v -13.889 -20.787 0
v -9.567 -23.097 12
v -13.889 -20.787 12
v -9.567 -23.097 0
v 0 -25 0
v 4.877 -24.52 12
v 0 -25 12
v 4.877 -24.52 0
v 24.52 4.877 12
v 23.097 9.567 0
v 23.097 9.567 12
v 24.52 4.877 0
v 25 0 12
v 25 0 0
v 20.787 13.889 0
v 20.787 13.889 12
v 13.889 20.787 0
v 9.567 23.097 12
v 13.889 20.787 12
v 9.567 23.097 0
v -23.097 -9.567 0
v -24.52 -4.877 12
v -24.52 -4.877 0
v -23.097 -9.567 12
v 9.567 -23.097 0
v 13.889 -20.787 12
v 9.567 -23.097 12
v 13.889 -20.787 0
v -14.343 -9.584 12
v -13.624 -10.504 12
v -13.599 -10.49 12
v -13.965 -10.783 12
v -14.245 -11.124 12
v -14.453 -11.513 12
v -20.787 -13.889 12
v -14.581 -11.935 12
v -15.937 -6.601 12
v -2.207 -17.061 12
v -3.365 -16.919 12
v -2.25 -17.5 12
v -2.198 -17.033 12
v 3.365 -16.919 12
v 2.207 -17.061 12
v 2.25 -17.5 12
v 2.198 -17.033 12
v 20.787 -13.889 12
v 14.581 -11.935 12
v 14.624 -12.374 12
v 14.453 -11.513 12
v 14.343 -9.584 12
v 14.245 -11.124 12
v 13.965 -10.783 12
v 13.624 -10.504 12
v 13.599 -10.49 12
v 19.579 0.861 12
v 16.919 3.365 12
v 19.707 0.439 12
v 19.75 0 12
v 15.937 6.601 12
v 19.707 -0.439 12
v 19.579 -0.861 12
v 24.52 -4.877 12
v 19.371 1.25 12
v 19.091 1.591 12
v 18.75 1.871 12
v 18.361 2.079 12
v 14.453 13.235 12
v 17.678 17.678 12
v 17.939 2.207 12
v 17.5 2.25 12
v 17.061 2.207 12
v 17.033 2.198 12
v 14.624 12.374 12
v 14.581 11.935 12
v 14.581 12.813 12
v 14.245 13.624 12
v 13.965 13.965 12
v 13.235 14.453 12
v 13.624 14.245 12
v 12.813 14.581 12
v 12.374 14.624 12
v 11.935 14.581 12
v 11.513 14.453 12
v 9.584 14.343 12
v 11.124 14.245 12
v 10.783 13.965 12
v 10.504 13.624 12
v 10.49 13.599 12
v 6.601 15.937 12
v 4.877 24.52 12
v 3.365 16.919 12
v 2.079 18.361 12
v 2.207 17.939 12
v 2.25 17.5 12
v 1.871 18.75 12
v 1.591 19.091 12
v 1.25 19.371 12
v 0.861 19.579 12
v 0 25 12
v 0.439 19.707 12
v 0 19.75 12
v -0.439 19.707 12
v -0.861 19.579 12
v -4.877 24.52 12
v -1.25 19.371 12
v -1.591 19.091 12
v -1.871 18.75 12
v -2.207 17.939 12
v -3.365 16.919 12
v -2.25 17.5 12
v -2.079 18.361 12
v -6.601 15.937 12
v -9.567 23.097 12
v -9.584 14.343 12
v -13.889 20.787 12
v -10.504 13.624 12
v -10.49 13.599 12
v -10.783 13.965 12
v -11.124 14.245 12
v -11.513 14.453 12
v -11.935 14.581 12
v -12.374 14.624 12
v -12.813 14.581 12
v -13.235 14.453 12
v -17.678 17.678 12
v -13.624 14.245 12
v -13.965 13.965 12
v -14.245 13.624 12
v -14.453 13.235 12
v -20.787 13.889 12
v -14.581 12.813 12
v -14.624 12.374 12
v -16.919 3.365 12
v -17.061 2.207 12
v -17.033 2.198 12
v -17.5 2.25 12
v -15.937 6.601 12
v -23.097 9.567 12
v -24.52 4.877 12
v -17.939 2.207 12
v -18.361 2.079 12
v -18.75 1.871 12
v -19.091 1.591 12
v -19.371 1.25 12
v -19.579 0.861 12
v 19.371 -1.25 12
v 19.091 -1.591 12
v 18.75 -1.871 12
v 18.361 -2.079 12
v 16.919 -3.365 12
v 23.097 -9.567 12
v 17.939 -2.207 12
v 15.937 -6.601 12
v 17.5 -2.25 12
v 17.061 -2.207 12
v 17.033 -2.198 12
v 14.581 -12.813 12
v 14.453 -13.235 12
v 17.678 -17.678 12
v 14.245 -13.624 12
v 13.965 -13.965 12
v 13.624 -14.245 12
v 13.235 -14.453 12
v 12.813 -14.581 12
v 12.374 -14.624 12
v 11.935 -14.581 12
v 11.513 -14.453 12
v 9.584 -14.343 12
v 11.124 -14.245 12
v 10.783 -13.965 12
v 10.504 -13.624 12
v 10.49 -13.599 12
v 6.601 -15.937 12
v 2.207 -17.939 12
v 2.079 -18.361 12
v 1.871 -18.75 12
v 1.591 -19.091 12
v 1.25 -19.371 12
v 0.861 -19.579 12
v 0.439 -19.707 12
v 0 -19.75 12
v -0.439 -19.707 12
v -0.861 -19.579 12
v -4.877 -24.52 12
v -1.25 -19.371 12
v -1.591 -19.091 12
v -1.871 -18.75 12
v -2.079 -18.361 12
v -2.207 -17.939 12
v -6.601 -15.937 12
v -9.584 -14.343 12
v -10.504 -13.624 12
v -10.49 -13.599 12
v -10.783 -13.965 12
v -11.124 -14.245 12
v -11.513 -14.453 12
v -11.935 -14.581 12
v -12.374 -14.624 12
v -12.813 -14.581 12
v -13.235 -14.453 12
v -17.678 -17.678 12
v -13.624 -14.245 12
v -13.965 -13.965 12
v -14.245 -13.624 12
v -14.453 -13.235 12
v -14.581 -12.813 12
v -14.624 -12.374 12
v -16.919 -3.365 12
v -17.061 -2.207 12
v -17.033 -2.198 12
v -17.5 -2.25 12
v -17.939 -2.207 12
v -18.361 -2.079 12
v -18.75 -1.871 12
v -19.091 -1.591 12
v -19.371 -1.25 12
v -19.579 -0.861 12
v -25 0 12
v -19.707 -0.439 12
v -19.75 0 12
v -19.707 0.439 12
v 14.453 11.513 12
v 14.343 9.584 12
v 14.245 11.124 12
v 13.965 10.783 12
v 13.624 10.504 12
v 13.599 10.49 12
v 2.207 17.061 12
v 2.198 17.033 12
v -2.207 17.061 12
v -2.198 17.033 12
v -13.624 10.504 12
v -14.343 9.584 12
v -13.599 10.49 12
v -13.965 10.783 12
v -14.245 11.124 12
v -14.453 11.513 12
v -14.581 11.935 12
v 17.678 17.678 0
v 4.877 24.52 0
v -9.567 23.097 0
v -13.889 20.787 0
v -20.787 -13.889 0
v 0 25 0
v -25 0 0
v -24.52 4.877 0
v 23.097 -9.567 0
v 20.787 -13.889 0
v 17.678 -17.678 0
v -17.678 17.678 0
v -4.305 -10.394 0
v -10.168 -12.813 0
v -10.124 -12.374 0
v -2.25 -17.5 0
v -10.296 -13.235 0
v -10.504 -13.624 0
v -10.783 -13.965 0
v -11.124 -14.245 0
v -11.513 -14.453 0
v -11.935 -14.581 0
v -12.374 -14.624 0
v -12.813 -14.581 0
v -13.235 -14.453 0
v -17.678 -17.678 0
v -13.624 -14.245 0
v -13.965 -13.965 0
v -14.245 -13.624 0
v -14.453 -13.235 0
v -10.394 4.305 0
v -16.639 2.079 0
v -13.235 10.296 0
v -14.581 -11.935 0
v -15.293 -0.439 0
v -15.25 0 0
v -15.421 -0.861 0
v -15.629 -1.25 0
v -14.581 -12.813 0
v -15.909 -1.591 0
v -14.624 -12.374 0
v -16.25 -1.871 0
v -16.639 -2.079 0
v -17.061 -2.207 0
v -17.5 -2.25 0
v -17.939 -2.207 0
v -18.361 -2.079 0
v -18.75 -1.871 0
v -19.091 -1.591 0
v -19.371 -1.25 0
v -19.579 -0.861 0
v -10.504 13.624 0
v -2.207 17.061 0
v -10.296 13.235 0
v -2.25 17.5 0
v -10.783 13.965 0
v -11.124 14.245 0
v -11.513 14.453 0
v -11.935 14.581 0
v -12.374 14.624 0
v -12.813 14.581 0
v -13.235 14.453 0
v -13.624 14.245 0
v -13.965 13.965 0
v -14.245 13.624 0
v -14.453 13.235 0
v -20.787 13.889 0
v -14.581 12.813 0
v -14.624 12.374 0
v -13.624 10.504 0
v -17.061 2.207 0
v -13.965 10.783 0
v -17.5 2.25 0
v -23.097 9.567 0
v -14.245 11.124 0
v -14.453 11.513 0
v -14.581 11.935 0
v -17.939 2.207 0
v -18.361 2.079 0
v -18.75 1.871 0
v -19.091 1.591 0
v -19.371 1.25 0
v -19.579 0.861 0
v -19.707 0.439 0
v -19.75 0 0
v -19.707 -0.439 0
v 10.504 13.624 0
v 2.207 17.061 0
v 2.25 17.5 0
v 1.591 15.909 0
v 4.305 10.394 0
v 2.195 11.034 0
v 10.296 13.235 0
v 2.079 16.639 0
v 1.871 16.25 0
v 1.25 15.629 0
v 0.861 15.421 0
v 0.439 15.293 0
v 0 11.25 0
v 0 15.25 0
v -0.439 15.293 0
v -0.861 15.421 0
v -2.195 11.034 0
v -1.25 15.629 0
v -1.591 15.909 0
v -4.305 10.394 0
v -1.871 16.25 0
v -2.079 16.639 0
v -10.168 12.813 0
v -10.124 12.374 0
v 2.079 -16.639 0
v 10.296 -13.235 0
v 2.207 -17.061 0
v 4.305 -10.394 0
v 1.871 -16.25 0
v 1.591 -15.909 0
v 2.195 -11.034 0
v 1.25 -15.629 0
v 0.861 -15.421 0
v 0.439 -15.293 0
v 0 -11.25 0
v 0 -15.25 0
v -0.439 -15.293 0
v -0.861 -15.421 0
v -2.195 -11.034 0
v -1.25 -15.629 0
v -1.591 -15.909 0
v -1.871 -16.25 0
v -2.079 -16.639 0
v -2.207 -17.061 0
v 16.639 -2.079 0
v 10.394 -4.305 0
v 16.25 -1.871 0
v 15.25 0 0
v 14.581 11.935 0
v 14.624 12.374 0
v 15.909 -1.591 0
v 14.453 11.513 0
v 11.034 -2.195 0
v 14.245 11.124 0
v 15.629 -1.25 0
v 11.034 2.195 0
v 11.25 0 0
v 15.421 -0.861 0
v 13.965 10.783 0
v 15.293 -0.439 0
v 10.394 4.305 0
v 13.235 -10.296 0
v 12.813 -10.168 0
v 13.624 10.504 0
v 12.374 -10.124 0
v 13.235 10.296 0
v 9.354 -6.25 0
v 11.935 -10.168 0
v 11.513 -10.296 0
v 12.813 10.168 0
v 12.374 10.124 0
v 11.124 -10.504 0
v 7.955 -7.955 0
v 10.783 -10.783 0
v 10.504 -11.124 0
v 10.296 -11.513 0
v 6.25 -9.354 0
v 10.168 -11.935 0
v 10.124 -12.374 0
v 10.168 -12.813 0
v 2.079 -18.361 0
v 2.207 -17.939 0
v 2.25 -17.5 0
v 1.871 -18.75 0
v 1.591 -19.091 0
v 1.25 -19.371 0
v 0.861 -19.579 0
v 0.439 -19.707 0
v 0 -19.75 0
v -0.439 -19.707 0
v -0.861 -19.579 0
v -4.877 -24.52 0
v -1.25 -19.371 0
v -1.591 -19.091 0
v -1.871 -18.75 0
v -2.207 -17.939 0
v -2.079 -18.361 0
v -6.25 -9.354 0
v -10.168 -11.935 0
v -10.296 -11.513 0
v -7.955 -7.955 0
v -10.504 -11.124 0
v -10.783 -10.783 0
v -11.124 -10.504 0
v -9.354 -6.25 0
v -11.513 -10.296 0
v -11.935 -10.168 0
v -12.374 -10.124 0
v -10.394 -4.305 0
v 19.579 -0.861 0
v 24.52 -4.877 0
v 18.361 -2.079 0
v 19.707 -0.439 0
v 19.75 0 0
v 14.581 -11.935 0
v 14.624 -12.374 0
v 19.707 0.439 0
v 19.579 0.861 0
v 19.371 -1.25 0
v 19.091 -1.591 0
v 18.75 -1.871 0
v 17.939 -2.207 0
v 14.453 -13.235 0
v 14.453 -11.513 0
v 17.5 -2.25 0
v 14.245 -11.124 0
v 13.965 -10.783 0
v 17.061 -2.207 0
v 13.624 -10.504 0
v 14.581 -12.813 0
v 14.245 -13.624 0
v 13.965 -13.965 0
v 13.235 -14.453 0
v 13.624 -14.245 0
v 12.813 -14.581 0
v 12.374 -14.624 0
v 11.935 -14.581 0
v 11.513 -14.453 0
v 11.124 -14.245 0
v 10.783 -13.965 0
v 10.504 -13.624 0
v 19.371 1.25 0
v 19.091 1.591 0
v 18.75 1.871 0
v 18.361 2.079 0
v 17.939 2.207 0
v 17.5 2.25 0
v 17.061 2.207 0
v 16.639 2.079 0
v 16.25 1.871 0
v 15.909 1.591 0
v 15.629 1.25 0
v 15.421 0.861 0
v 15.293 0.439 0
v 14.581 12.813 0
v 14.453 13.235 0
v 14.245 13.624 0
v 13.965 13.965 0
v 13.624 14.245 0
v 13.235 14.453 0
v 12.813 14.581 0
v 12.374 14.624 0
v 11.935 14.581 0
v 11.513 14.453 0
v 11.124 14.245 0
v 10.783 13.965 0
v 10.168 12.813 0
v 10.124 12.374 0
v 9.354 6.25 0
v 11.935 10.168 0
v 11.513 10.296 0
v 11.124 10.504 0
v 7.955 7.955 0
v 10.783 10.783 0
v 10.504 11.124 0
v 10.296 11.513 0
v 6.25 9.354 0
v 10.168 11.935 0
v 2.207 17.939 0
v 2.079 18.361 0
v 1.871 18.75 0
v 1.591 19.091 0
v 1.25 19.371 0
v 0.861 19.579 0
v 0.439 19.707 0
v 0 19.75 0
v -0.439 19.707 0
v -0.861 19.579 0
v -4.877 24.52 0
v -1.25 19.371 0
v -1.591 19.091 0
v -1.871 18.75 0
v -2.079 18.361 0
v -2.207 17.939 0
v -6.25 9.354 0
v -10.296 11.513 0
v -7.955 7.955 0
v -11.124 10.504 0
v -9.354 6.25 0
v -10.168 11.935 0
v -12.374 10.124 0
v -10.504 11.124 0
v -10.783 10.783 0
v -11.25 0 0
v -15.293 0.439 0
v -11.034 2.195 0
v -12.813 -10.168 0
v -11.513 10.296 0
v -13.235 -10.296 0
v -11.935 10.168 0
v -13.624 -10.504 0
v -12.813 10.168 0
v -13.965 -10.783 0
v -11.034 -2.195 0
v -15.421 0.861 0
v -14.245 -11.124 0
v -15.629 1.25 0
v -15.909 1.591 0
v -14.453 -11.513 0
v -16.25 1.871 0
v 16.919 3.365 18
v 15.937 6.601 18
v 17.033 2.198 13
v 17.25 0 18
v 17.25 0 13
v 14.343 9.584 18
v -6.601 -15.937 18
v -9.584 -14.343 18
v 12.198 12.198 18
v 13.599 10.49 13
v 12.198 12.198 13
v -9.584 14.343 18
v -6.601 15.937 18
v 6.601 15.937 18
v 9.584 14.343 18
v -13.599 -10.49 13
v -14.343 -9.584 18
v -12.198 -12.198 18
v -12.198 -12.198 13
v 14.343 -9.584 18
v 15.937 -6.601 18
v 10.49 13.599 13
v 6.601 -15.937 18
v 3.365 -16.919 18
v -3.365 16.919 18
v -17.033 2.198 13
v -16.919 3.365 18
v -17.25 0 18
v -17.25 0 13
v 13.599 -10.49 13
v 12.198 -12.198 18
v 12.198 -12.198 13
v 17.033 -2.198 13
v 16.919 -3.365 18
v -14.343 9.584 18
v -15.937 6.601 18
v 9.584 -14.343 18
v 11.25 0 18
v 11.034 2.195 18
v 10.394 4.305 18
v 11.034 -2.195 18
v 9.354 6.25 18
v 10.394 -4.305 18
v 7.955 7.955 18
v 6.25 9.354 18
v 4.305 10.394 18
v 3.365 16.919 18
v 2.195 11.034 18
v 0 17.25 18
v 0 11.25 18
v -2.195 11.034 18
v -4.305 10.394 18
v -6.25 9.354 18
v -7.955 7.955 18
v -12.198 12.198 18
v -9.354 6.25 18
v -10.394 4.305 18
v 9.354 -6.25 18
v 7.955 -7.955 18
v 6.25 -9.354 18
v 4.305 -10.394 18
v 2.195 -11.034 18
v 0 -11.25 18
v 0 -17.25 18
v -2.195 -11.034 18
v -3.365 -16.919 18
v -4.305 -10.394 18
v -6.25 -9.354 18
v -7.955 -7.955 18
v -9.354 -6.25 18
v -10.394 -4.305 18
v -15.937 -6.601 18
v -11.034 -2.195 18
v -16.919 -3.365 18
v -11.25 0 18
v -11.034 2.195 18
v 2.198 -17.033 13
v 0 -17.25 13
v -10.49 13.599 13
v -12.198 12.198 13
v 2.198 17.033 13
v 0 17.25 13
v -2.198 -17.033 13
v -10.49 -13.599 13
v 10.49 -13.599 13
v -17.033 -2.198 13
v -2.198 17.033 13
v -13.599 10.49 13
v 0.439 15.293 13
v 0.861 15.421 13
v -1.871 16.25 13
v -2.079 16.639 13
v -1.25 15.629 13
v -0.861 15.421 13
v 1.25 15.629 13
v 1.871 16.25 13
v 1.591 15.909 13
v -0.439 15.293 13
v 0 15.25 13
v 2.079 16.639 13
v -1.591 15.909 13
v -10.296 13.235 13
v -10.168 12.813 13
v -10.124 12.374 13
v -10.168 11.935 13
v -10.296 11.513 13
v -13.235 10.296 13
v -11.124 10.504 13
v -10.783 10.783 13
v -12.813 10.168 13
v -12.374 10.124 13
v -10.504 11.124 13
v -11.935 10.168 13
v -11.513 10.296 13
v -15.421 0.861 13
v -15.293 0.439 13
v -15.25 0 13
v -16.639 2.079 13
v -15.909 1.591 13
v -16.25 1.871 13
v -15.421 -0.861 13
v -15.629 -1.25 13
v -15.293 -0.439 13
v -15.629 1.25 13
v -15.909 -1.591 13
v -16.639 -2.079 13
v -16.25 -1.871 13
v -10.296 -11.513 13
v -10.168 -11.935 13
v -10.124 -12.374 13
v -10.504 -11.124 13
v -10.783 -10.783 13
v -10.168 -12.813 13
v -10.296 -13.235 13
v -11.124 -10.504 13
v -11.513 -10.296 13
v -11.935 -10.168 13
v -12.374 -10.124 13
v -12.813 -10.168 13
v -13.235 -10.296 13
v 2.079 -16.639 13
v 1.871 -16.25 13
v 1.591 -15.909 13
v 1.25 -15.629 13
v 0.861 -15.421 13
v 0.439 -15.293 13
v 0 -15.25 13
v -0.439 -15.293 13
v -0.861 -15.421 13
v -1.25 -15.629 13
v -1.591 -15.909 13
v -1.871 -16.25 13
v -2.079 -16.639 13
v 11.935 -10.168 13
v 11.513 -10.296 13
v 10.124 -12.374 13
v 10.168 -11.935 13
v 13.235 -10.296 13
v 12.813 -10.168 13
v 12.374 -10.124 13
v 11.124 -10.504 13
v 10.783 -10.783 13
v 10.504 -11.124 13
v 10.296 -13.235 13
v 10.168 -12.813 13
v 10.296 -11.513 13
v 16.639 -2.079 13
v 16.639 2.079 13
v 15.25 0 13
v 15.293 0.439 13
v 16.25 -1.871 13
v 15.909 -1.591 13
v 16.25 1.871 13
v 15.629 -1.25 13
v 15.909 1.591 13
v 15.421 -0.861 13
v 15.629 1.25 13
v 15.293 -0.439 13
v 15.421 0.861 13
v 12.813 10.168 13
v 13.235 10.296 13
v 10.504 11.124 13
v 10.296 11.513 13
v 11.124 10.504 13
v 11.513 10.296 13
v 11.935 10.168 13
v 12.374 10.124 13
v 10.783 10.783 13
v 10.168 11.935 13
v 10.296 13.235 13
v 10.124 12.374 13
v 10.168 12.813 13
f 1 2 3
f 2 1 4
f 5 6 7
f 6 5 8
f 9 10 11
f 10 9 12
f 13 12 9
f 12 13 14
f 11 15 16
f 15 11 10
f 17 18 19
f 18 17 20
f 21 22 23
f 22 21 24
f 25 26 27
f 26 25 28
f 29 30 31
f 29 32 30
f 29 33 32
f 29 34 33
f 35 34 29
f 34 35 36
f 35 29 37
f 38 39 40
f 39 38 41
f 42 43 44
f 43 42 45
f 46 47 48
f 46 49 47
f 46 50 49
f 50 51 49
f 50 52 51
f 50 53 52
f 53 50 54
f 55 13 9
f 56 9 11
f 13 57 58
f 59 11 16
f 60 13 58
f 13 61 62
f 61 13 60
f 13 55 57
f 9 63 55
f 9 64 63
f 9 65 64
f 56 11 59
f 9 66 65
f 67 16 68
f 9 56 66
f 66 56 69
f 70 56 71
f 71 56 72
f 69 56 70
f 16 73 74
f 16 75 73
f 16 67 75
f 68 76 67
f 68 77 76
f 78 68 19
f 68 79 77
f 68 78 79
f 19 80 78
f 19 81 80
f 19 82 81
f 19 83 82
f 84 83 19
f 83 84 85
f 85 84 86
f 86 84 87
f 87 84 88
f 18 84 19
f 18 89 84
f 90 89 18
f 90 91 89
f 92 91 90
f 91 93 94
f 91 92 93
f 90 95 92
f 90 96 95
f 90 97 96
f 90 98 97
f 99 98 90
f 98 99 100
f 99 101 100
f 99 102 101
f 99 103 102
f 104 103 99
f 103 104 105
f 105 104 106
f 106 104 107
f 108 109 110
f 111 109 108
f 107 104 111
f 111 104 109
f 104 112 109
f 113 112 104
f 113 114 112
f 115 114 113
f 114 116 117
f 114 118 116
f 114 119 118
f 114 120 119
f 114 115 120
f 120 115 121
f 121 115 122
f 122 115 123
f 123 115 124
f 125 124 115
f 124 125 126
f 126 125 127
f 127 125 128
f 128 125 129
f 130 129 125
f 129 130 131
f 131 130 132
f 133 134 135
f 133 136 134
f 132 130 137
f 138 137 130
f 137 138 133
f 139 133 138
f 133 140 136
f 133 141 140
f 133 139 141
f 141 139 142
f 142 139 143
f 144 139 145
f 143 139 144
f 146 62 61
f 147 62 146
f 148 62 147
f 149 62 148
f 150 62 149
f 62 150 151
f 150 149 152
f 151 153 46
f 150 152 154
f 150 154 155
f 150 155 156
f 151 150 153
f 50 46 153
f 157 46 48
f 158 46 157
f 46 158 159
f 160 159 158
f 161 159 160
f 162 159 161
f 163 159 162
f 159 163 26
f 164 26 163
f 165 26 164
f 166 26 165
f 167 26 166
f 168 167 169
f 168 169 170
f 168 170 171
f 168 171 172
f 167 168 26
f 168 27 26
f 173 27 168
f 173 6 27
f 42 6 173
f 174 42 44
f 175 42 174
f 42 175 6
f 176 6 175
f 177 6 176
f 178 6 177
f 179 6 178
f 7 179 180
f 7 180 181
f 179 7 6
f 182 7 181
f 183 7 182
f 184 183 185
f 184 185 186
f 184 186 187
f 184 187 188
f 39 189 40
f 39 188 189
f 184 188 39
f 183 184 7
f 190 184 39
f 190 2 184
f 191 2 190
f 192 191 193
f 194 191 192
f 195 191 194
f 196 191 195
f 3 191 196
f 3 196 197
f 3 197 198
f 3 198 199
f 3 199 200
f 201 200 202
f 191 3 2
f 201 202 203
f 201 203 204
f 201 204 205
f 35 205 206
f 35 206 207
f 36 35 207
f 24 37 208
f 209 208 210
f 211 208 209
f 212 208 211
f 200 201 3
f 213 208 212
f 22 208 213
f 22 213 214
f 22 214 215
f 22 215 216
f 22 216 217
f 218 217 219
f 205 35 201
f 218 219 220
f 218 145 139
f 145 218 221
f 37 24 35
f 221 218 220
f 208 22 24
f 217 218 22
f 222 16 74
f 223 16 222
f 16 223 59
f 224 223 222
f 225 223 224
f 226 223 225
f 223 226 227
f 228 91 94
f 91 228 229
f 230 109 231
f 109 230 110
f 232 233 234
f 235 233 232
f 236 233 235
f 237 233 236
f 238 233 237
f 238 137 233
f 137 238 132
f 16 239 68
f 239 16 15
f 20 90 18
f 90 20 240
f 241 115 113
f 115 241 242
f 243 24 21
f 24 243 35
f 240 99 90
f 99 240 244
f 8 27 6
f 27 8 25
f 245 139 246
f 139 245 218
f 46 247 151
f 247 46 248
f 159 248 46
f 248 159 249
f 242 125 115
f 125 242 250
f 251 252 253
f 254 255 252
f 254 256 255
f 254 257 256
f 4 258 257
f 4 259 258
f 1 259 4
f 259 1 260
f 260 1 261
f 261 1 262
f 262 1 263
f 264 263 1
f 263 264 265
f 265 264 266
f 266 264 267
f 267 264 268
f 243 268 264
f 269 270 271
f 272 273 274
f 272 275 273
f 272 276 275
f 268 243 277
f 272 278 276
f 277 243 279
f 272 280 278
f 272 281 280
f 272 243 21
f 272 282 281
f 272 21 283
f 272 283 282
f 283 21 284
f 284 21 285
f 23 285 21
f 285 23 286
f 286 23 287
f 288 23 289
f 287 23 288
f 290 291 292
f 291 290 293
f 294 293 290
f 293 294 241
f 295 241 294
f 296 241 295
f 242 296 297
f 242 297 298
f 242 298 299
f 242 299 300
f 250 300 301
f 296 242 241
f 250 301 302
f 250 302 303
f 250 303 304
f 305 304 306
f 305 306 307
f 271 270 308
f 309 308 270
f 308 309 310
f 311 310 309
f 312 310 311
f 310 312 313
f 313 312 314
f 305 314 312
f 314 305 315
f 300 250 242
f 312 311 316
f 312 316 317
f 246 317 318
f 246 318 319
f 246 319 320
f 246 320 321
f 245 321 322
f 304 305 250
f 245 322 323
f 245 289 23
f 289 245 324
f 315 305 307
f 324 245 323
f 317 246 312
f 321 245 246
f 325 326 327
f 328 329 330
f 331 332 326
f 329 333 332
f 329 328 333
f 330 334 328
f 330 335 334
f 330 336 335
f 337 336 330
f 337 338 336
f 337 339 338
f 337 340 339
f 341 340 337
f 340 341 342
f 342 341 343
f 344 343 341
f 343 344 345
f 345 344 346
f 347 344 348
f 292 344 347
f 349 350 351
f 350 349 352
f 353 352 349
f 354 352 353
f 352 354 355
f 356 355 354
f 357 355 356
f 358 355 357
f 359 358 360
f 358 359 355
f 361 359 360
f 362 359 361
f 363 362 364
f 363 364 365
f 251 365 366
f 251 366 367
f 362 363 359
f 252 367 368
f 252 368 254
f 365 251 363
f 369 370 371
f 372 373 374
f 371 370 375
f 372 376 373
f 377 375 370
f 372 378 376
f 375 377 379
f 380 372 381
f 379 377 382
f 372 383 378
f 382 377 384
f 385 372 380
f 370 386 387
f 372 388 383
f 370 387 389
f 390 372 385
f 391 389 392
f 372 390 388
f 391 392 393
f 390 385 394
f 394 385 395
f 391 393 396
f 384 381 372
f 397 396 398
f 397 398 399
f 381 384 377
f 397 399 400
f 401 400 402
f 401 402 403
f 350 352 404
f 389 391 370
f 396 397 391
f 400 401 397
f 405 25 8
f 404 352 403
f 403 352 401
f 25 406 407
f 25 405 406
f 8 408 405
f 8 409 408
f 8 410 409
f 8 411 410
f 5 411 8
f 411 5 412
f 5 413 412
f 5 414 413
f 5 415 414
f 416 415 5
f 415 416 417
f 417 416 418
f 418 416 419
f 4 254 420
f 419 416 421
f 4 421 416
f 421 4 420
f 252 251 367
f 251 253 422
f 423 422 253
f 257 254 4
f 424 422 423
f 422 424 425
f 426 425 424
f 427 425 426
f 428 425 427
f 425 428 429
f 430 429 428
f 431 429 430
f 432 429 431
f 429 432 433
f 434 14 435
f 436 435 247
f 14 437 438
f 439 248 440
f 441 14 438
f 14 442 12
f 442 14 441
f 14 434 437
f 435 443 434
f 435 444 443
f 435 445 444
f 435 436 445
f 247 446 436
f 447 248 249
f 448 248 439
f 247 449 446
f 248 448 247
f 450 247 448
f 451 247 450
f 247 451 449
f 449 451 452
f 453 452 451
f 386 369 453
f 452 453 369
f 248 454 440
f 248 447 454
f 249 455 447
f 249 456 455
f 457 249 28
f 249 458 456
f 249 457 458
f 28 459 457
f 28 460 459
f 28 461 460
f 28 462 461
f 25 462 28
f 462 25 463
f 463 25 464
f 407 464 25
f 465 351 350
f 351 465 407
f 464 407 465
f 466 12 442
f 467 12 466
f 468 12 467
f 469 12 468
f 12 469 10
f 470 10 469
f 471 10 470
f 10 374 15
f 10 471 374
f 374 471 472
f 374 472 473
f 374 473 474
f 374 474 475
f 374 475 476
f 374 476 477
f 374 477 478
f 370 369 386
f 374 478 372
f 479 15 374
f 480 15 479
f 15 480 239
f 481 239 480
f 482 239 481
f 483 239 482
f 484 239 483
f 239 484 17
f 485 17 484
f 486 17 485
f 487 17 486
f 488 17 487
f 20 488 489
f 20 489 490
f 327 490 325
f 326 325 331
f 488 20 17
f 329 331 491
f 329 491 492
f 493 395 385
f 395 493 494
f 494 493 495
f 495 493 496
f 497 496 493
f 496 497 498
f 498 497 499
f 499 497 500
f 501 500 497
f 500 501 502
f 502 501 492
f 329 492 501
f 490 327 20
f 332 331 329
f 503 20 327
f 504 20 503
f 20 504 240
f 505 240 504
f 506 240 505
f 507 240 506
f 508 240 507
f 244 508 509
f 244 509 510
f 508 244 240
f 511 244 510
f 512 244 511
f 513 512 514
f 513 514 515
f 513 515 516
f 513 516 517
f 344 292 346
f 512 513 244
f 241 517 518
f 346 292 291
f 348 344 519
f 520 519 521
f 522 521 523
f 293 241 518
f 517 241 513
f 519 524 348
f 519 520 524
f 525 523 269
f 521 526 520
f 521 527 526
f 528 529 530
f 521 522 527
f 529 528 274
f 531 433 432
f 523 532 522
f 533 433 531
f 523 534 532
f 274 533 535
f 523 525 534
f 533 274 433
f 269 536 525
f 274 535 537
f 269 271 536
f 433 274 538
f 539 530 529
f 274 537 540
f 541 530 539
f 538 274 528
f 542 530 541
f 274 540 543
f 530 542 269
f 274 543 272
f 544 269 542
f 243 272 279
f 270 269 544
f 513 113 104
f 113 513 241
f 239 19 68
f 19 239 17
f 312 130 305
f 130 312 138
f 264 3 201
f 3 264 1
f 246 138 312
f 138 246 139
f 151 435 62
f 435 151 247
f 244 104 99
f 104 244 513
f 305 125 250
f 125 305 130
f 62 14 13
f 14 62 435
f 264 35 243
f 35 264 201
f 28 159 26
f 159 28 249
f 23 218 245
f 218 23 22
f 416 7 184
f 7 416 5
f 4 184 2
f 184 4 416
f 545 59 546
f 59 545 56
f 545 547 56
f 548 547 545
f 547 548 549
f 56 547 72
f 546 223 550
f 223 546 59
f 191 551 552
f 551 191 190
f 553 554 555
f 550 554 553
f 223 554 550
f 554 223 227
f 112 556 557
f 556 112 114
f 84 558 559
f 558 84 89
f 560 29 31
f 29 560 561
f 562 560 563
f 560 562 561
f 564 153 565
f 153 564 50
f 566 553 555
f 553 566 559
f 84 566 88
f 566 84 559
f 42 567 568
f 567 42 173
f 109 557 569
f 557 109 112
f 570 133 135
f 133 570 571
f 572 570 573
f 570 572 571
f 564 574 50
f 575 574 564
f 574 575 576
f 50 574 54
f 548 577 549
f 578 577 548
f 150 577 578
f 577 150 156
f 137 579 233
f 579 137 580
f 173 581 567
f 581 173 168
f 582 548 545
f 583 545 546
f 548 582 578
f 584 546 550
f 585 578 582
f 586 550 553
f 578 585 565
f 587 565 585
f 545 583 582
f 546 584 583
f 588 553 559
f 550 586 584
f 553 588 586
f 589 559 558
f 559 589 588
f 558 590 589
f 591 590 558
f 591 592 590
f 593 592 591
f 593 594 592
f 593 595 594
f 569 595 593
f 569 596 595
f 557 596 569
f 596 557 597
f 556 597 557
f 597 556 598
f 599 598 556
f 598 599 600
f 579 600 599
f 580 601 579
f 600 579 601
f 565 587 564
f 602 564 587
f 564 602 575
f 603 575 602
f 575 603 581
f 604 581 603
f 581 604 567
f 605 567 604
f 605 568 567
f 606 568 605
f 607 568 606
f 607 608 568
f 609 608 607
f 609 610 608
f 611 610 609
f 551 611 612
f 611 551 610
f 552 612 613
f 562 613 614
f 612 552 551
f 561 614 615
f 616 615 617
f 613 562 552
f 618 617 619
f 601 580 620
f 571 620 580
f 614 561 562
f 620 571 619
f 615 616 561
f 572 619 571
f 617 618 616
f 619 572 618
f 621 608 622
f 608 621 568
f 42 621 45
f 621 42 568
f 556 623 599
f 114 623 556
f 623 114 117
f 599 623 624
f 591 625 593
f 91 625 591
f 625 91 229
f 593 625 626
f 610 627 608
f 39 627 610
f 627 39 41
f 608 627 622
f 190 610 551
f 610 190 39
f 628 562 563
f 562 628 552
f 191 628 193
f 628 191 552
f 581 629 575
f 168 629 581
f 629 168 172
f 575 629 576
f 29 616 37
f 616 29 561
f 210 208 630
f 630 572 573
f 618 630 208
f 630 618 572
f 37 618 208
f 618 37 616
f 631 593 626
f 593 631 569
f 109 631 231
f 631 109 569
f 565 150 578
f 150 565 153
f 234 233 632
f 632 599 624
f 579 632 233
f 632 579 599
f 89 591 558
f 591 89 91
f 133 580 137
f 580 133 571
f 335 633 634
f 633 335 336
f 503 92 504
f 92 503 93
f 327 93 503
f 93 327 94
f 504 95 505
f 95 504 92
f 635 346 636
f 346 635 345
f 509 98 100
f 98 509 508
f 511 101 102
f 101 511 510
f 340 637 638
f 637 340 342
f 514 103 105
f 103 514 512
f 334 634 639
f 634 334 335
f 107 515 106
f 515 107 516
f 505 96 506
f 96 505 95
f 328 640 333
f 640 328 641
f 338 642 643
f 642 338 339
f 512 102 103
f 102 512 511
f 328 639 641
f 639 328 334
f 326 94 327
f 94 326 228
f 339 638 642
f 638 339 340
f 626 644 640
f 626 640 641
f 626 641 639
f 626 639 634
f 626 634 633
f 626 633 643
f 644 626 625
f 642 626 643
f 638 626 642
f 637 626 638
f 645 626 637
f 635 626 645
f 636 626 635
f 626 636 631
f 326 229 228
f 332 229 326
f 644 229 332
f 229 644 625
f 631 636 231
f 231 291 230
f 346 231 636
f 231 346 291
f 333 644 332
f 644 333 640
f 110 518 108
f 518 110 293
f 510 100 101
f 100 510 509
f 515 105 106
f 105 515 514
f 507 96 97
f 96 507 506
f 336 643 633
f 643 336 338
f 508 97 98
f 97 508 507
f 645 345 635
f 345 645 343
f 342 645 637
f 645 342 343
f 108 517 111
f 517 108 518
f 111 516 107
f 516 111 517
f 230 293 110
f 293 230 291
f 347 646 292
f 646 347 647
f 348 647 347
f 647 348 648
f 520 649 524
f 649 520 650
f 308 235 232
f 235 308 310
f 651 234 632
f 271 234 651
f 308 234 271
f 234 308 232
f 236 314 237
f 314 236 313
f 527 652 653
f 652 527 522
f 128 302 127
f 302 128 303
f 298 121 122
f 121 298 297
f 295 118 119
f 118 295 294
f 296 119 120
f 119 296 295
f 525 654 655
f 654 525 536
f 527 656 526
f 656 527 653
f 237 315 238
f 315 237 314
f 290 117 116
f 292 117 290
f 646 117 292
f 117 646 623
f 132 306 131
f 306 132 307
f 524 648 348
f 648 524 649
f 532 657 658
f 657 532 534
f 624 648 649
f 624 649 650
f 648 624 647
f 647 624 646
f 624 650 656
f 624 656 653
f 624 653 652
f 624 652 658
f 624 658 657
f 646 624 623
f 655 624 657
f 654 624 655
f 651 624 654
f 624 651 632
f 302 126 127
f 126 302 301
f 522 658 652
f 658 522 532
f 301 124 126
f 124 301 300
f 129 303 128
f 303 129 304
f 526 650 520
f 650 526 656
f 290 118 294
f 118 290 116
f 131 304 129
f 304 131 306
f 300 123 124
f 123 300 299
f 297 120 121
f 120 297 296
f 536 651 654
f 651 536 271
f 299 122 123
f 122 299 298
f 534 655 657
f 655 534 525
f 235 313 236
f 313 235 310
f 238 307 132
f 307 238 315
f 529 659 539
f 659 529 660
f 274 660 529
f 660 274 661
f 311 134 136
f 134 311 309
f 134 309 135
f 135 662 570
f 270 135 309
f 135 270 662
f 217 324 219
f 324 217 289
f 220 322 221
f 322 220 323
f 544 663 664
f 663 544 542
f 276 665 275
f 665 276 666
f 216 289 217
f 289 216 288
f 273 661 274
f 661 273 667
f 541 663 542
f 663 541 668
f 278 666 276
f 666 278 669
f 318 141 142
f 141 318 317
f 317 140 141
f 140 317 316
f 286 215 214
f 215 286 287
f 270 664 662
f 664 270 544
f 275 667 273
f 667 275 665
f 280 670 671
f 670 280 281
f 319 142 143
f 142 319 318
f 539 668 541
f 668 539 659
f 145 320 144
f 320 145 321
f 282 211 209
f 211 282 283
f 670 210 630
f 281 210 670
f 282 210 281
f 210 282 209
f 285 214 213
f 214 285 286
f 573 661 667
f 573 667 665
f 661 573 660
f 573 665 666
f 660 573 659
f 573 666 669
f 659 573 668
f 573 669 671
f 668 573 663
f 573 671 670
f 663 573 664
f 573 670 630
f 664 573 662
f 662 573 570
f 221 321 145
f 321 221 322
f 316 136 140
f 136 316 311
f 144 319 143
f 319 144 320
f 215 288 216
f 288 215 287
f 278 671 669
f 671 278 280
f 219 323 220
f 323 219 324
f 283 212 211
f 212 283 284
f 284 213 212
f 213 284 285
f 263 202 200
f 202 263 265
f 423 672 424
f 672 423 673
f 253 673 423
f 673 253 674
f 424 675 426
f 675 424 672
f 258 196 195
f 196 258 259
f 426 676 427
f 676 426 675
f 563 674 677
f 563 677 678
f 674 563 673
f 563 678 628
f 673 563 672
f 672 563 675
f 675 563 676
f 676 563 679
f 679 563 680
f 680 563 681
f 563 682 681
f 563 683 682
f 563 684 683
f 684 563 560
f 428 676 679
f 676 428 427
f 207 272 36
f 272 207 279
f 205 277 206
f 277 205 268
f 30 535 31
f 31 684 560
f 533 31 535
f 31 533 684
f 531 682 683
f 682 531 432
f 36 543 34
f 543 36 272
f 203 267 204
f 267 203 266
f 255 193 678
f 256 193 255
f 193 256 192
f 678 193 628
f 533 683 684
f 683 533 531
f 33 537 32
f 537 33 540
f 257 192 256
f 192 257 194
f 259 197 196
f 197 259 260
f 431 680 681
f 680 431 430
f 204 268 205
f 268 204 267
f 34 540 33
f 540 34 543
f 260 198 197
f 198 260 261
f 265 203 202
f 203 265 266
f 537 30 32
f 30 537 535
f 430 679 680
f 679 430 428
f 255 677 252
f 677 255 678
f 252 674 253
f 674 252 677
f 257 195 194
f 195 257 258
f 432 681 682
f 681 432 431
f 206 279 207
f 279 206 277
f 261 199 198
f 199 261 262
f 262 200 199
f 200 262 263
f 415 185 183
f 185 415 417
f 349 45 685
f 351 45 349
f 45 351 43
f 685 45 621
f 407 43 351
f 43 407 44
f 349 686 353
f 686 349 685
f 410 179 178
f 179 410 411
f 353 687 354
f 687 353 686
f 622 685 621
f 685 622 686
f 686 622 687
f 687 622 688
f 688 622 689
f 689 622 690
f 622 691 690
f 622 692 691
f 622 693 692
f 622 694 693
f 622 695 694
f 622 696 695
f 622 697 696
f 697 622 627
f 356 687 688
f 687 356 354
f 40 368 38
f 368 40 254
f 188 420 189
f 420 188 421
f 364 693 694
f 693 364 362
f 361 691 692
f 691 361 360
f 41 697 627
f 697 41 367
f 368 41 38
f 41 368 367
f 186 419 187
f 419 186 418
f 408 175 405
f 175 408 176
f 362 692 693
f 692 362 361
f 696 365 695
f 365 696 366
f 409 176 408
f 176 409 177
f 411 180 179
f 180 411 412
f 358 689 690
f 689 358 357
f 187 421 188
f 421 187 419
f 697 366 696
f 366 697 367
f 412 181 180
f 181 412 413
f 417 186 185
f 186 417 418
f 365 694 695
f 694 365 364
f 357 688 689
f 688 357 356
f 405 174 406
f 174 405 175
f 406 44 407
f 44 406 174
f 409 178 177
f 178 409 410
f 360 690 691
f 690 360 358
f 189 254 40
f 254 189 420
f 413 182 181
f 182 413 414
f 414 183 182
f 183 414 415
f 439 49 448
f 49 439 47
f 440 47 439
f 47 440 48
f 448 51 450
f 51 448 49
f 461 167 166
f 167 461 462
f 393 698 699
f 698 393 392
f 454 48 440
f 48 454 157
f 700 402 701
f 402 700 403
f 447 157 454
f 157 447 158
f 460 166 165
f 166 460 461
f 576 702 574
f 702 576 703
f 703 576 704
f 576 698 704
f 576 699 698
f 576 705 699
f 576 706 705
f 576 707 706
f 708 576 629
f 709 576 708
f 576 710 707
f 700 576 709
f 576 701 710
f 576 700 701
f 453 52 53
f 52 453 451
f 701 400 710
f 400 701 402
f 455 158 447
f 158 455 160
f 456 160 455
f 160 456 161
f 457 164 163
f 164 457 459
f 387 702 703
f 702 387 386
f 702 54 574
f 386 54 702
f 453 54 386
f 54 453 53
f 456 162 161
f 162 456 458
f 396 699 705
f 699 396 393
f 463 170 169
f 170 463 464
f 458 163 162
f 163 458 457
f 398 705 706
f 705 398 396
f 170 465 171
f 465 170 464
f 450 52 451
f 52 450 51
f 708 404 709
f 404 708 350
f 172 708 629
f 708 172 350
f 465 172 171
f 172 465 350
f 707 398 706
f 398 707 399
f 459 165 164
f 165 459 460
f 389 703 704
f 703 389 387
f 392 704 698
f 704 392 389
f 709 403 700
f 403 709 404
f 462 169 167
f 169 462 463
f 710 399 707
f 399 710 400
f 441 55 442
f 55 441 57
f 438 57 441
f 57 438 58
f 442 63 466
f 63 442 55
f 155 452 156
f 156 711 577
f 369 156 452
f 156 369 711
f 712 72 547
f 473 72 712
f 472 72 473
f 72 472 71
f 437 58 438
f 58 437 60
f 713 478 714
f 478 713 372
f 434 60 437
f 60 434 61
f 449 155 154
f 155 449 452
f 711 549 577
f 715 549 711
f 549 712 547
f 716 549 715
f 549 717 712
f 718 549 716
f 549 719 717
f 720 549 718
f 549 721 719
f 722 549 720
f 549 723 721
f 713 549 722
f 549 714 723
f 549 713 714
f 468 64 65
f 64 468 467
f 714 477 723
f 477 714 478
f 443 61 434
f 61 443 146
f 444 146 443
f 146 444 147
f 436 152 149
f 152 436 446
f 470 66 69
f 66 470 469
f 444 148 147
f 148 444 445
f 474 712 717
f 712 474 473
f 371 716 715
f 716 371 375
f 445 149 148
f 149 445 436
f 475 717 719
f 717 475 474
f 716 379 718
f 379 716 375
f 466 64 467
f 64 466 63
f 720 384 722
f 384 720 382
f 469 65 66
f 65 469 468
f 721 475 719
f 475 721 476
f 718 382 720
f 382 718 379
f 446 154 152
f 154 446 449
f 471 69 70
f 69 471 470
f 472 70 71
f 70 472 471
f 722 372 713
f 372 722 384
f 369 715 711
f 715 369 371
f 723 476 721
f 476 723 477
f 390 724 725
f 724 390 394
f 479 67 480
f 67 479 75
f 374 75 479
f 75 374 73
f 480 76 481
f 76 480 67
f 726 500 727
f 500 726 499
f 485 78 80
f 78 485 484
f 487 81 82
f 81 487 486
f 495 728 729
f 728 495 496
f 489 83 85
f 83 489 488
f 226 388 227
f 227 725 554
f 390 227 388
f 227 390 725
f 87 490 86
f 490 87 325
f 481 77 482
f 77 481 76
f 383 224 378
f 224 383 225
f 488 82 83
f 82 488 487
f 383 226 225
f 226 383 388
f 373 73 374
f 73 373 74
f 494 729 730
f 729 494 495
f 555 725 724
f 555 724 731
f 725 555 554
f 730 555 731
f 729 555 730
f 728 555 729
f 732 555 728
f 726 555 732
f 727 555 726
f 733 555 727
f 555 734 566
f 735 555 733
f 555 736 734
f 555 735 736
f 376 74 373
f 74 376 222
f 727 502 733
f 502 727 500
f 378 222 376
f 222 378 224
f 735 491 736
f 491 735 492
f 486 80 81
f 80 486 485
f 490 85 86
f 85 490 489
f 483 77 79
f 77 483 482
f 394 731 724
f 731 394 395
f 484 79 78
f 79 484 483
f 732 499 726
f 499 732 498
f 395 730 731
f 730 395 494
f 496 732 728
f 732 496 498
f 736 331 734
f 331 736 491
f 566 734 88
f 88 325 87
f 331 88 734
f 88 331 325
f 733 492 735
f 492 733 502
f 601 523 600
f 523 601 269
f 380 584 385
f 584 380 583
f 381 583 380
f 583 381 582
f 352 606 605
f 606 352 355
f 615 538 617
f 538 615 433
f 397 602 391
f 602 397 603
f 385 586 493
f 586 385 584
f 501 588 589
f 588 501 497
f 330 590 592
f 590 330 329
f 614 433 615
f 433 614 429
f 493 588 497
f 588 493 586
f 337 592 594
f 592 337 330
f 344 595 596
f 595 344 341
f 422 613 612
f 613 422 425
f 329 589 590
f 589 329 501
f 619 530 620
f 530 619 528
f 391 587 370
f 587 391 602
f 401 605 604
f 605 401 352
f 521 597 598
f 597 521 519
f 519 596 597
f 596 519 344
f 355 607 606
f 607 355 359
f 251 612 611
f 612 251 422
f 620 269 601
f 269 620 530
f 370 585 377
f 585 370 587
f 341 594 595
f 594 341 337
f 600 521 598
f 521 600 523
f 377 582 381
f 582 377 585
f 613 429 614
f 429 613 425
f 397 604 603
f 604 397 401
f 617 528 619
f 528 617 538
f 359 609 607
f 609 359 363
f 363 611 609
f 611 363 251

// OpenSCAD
$fn = 32;

// ----------------------------------------------------------------------
// Flange Ø50 x 12
// 8 holes on a Ø35 bolt circle, bolted joints
// ----------------------------------------------------------------------

// --- parameters (mm) ---
flange_d = 50;   // outside diameter of the flange
thickness = 12;  // flange thickness
holes = 8;       // number of bolt holes
pcd = 35;        // bolt circle diameter
start_deg = 90;  // angle of the first hole, from +X
hole_d = 4.5;    // bolt hole diameter
bore_d = 22.5;   // central through bore
hub_d = 34.5;    // hub outside diameter
hub_h = 6;       // hub height above the flange face (0 = no hub)

// --- derived feature positions (mm) ---
height = thickness + hub_h;  // = 18   overall height of the part
pcd_r = pcd / 2;             // = 17.5   bolt circle radius
hole_step = 360 / holes;     // = 45   angular pitch
feature_centers = [
  [pcd_r * cos(start_deg + 0 * hole_step), pcd_r * sin(start_deg + 0 * hole_step)],
  [pcd_r * cos(start_deg + 1 * hole_step), pcd_r * sin(start_deg + 1 * hole_step)],
  [pcd_r * cos(start_deg + 2 * hole_step), pcd_r * sin(start_deg + 2 * hole_step)],
  [pcd_r * cos(start_deg + 3 * hole_step), pcd_r * sin(start_deg + 3 * hole_step)],
  [pcd_r * cos(start_deg + 4 * hole_step), pcd_r * sin(start_deg + 4 * hole_step)],
  [pcd_r * cos(start_deg + 5 * hole_step), pcd_r * sin(start_deg + 5 * hole_step)],
  [pcd_r * cos(start_deg + 6 * hole_step), pcd_r * sin(start_deg + 6 * hole_step)],
  [pcd_r * cos(start_deg + 7 * hole_step), pcd_r * sin(start_deg + 7 * hole_step)]
];   // bolt hole centres on the pitch circle

// flange disc, every hole and the bore cut straight through
difference() {
  union() {
    cylinder(d = flange_d, h = thickness);
    cylinder(d = hub_d, h = height);  // hub, overlapped into the flange
  }
  translate([0, 0, -1]) cylinder(d = bore_d, h = height + 2);  // bore, through
  for (centre = feature_centers)
    translate([centre[0], centre[1], -1]) cylinder(d = hole_d, h = thickness + 2);
}
